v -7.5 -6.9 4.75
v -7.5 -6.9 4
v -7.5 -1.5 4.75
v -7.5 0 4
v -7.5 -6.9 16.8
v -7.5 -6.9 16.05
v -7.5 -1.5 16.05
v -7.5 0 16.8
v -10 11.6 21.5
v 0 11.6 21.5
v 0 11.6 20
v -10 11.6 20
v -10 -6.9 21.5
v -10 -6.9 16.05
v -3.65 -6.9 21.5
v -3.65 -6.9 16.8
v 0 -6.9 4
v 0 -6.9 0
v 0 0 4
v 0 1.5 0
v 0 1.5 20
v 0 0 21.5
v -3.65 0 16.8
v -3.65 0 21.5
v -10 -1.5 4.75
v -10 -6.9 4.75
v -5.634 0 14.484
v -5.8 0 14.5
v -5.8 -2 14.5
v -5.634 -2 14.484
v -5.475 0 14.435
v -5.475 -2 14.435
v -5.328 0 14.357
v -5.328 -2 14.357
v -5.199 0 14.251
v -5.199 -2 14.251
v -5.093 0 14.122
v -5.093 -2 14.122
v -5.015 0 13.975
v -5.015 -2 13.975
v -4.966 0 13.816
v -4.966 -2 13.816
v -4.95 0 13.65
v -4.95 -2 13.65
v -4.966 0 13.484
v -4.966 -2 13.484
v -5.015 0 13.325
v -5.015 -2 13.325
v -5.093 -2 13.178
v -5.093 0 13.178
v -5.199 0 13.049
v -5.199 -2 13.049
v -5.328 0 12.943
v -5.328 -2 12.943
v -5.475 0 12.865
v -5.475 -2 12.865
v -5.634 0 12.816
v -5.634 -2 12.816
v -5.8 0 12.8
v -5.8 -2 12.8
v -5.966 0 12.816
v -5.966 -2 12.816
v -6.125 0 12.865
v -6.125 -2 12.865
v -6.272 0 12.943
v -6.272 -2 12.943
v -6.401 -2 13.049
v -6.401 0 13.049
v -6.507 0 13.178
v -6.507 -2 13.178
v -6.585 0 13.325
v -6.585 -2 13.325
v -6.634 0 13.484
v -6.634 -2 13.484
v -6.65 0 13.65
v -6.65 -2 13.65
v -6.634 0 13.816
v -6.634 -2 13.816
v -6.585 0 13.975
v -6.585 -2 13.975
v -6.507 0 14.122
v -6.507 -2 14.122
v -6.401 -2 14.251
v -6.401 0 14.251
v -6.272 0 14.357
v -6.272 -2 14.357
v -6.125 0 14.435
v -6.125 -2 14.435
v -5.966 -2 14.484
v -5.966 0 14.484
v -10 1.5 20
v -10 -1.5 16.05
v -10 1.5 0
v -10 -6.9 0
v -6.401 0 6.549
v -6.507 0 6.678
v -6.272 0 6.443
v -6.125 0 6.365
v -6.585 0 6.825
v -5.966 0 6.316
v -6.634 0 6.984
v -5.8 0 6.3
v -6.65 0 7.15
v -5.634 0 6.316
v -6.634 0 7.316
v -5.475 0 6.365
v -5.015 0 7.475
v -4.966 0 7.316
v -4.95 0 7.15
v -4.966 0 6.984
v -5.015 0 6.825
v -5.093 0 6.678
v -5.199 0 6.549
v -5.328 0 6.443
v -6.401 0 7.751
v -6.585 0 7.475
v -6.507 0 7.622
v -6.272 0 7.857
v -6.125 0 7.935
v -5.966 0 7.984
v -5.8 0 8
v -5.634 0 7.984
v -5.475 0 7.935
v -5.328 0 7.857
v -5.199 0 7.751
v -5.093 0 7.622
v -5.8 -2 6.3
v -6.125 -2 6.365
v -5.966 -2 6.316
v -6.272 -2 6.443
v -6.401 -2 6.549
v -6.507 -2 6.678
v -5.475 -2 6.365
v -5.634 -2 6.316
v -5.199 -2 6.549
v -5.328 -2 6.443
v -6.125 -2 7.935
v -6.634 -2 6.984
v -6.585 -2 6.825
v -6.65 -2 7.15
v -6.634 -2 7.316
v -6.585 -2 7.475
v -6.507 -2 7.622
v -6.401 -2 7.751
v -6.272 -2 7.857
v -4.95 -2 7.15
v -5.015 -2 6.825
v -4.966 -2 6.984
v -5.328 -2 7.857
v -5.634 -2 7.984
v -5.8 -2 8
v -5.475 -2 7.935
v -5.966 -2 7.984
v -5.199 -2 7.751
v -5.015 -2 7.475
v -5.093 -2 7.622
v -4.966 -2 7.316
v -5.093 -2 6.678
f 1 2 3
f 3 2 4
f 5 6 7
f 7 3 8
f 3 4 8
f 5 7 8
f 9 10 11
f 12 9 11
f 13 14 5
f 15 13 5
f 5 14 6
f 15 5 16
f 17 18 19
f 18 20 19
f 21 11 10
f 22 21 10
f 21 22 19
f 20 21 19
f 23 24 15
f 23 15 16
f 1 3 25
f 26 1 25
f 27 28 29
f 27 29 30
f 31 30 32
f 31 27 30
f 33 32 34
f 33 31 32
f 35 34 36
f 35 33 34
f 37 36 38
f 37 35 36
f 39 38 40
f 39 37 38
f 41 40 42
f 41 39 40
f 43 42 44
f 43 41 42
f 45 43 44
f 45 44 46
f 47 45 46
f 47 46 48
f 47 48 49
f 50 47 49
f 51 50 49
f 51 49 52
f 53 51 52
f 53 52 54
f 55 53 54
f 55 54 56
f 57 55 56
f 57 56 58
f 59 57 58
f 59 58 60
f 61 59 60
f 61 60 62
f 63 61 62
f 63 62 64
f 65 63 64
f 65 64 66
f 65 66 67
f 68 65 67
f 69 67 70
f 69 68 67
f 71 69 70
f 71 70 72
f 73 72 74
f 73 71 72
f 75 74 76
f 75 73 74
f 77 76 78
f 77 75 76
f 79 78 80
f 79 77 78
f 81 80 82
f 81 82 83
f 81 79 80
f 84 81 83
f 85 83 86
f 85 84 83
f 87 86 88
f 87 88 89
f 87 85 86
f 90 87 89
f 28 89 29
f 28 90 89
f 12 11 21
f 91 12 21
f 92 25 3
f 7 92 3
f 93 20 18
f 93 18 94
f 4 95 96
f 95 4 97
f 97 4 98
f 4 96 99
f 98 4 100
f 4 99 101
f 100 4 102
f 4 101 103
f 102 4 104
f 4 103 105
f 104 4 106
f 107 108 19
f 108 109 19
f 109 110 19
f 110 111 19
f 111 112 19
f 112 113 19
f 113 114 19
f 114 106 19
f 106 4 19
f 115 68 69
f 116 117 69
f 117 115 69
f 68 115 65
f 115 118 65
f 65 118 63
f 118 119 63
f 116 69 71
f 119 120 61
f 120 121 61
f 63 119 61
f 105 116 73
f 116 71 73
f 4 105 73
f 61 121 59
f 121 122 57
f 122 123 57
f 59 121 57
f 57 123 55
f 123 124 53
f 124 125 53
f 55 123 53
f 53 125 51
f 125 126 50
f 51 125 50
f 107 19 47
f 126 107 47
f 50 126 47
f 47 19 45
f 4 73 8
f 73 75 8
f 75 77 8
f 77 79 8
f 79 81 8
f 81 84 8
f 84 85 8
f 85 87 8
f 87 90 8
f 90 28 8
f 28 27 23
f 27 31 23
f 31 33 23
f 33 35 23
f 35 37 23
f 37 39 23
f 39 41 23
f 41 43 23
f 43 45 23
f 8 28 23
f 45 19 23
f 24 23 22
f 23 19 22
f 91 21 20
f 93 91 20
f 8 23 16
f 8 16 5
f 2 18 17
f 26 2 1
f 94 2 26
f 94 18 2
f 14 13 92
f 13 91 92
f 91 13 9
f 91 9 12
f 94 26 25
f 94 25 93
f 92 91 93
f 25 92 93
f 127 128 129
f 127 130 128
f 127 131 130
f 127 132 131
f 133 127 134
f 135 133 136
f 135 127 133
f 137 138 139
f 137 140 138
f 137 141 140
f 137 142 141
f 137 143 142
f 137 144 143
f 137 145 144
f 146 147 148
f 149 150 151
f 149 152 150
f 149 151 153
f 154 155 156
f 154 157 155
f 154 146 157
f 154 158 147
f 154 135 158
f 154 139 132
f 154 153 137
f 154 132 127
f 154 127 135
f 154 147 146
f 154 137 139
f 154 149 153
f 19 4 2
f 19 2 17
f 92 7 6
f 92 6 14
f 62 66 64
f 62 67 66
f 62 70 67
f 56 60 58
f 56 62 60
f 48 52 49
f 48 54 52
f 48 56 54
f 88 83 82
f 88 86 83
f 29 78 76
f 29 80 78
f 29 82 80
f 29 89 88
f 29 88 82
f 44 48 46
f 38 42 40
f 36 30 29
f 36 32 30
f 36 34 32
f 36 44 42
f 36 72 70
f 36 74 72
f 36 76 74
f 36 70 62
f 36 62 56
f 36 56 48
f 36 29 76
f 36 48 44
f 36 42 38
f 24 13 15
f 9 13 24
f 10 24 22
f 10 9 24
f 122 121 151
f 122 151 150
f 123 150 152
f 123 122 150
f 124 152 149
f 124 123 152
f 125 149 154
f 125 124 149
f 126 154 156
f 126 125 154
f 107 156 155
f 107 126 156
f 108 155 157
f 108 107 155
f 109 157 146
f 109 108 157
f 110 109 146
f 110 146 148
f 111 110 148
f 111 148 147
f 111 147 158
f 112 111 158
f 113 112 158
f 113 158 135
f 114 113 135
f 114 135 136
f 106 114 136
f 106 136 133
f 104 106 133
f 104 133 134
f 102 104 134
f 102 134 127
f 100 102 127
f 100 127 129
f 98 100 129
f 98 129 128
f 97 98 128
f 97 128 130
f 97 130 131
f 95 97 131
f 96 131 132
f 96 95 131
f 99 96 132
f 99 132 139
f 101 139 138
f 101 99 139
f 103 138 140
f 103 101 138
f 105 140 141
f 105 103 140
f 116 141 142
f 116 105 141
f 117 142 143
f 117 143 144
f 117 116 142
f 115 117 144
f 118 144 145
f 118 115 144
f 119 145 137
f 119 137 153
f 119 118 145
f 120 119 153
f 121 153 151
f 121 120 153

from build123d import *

# Parameters (mm, degrees)
EXTRUDE_3_DEPTH     = 10
SKETCH_4_W          = 2.5
SKETCH_4_H          = 21.5
EXTRUDE_4_DEPTH     = 1.5
SKETCH_5_R          = 0.85
EXTRUDE_5_DEPTH     = 6.9
CUT_EXTRUDE_START   = 2
SKETCH_6_W          = 3.85
SKETCH_6_H          = 12.8
CUT_EXTRUDE_1_DEPTH = 25.397158938


with BuildPart() as part:
    # Эскиз3 → Бобышка-Вытянуть3 (new body)
    with BuildSketch(Plane(origin=(0, 0, 0), x_dir=(0, 0, -1), z_dir=(1, 0, 0))):
        Polygon((0, 0), (-21.5, 0), (-21.5, 11.6), (-20, 11.6), (-20, 1.5), (0, 1.5), align=None)
    extrude(amount=-EXTRUDE_3_DEPTH)

    # Эскиз4 → Бобышка-Вытянуть4 (add)
    with BuildSketch(Plane(origin=(0, 0, 0), x_dir=(1, 0, 0), z_dir=(0, 1, 0))):
        with Locations((-8.75, -10.75)):
            Rectangle(SKETCH_4_W, SKETCH_4_H)
    extrude(amount=-EXTRUDE_4_DEPTH)

    # Эскиз5 → Бобышка-Вытянуть5 (add)
    with BuildSketch(Plane(origin=(0, 0, 0), x_dir=(1, 0, 0), z_dir=(0, 1, 0))):
        with Locations(Location((-5.8, -7.15, 0), (0, 0, 270))):
            Circle(SKETCH_5_R)
        with Locations(Location((-5.8, -13.65, 0), (0, 0, 270))):
            Circle(SKETCH_5_R)
        Polygon((-7.5, 0), (-3.65, 0), (0, 0), (0, -4), (-3.65, -4), (-7.5, -4), (-7.5, -4.75), (-10, -4.75), (-10, 0), align=None)
        Polygon((-7.5, -21.5), (-3.65, -21.5), (-3.65, -16.8), (-7.5, -16.8), (-7.5, -16.05), (-10, -16.05), (-10, -21.5), align=None)
    extrude(amount=-EXTRUDE_5_DEPTH)

    # Эскиз6 → Вырез-Вытянуть1 (cut, through all)
    with BuildSketch(Plane.XZ.offset(CUT_EXTRUDE_START)):
        with Locations((-5.575, 10.4)):
            Rectangle(SKETCH_6_W, SKETCH_6_H)
    extrude(amount=CUT_EXTRUDE_1_DEPTH, mode=Mode.SUBTRACT)


solid = part.part
